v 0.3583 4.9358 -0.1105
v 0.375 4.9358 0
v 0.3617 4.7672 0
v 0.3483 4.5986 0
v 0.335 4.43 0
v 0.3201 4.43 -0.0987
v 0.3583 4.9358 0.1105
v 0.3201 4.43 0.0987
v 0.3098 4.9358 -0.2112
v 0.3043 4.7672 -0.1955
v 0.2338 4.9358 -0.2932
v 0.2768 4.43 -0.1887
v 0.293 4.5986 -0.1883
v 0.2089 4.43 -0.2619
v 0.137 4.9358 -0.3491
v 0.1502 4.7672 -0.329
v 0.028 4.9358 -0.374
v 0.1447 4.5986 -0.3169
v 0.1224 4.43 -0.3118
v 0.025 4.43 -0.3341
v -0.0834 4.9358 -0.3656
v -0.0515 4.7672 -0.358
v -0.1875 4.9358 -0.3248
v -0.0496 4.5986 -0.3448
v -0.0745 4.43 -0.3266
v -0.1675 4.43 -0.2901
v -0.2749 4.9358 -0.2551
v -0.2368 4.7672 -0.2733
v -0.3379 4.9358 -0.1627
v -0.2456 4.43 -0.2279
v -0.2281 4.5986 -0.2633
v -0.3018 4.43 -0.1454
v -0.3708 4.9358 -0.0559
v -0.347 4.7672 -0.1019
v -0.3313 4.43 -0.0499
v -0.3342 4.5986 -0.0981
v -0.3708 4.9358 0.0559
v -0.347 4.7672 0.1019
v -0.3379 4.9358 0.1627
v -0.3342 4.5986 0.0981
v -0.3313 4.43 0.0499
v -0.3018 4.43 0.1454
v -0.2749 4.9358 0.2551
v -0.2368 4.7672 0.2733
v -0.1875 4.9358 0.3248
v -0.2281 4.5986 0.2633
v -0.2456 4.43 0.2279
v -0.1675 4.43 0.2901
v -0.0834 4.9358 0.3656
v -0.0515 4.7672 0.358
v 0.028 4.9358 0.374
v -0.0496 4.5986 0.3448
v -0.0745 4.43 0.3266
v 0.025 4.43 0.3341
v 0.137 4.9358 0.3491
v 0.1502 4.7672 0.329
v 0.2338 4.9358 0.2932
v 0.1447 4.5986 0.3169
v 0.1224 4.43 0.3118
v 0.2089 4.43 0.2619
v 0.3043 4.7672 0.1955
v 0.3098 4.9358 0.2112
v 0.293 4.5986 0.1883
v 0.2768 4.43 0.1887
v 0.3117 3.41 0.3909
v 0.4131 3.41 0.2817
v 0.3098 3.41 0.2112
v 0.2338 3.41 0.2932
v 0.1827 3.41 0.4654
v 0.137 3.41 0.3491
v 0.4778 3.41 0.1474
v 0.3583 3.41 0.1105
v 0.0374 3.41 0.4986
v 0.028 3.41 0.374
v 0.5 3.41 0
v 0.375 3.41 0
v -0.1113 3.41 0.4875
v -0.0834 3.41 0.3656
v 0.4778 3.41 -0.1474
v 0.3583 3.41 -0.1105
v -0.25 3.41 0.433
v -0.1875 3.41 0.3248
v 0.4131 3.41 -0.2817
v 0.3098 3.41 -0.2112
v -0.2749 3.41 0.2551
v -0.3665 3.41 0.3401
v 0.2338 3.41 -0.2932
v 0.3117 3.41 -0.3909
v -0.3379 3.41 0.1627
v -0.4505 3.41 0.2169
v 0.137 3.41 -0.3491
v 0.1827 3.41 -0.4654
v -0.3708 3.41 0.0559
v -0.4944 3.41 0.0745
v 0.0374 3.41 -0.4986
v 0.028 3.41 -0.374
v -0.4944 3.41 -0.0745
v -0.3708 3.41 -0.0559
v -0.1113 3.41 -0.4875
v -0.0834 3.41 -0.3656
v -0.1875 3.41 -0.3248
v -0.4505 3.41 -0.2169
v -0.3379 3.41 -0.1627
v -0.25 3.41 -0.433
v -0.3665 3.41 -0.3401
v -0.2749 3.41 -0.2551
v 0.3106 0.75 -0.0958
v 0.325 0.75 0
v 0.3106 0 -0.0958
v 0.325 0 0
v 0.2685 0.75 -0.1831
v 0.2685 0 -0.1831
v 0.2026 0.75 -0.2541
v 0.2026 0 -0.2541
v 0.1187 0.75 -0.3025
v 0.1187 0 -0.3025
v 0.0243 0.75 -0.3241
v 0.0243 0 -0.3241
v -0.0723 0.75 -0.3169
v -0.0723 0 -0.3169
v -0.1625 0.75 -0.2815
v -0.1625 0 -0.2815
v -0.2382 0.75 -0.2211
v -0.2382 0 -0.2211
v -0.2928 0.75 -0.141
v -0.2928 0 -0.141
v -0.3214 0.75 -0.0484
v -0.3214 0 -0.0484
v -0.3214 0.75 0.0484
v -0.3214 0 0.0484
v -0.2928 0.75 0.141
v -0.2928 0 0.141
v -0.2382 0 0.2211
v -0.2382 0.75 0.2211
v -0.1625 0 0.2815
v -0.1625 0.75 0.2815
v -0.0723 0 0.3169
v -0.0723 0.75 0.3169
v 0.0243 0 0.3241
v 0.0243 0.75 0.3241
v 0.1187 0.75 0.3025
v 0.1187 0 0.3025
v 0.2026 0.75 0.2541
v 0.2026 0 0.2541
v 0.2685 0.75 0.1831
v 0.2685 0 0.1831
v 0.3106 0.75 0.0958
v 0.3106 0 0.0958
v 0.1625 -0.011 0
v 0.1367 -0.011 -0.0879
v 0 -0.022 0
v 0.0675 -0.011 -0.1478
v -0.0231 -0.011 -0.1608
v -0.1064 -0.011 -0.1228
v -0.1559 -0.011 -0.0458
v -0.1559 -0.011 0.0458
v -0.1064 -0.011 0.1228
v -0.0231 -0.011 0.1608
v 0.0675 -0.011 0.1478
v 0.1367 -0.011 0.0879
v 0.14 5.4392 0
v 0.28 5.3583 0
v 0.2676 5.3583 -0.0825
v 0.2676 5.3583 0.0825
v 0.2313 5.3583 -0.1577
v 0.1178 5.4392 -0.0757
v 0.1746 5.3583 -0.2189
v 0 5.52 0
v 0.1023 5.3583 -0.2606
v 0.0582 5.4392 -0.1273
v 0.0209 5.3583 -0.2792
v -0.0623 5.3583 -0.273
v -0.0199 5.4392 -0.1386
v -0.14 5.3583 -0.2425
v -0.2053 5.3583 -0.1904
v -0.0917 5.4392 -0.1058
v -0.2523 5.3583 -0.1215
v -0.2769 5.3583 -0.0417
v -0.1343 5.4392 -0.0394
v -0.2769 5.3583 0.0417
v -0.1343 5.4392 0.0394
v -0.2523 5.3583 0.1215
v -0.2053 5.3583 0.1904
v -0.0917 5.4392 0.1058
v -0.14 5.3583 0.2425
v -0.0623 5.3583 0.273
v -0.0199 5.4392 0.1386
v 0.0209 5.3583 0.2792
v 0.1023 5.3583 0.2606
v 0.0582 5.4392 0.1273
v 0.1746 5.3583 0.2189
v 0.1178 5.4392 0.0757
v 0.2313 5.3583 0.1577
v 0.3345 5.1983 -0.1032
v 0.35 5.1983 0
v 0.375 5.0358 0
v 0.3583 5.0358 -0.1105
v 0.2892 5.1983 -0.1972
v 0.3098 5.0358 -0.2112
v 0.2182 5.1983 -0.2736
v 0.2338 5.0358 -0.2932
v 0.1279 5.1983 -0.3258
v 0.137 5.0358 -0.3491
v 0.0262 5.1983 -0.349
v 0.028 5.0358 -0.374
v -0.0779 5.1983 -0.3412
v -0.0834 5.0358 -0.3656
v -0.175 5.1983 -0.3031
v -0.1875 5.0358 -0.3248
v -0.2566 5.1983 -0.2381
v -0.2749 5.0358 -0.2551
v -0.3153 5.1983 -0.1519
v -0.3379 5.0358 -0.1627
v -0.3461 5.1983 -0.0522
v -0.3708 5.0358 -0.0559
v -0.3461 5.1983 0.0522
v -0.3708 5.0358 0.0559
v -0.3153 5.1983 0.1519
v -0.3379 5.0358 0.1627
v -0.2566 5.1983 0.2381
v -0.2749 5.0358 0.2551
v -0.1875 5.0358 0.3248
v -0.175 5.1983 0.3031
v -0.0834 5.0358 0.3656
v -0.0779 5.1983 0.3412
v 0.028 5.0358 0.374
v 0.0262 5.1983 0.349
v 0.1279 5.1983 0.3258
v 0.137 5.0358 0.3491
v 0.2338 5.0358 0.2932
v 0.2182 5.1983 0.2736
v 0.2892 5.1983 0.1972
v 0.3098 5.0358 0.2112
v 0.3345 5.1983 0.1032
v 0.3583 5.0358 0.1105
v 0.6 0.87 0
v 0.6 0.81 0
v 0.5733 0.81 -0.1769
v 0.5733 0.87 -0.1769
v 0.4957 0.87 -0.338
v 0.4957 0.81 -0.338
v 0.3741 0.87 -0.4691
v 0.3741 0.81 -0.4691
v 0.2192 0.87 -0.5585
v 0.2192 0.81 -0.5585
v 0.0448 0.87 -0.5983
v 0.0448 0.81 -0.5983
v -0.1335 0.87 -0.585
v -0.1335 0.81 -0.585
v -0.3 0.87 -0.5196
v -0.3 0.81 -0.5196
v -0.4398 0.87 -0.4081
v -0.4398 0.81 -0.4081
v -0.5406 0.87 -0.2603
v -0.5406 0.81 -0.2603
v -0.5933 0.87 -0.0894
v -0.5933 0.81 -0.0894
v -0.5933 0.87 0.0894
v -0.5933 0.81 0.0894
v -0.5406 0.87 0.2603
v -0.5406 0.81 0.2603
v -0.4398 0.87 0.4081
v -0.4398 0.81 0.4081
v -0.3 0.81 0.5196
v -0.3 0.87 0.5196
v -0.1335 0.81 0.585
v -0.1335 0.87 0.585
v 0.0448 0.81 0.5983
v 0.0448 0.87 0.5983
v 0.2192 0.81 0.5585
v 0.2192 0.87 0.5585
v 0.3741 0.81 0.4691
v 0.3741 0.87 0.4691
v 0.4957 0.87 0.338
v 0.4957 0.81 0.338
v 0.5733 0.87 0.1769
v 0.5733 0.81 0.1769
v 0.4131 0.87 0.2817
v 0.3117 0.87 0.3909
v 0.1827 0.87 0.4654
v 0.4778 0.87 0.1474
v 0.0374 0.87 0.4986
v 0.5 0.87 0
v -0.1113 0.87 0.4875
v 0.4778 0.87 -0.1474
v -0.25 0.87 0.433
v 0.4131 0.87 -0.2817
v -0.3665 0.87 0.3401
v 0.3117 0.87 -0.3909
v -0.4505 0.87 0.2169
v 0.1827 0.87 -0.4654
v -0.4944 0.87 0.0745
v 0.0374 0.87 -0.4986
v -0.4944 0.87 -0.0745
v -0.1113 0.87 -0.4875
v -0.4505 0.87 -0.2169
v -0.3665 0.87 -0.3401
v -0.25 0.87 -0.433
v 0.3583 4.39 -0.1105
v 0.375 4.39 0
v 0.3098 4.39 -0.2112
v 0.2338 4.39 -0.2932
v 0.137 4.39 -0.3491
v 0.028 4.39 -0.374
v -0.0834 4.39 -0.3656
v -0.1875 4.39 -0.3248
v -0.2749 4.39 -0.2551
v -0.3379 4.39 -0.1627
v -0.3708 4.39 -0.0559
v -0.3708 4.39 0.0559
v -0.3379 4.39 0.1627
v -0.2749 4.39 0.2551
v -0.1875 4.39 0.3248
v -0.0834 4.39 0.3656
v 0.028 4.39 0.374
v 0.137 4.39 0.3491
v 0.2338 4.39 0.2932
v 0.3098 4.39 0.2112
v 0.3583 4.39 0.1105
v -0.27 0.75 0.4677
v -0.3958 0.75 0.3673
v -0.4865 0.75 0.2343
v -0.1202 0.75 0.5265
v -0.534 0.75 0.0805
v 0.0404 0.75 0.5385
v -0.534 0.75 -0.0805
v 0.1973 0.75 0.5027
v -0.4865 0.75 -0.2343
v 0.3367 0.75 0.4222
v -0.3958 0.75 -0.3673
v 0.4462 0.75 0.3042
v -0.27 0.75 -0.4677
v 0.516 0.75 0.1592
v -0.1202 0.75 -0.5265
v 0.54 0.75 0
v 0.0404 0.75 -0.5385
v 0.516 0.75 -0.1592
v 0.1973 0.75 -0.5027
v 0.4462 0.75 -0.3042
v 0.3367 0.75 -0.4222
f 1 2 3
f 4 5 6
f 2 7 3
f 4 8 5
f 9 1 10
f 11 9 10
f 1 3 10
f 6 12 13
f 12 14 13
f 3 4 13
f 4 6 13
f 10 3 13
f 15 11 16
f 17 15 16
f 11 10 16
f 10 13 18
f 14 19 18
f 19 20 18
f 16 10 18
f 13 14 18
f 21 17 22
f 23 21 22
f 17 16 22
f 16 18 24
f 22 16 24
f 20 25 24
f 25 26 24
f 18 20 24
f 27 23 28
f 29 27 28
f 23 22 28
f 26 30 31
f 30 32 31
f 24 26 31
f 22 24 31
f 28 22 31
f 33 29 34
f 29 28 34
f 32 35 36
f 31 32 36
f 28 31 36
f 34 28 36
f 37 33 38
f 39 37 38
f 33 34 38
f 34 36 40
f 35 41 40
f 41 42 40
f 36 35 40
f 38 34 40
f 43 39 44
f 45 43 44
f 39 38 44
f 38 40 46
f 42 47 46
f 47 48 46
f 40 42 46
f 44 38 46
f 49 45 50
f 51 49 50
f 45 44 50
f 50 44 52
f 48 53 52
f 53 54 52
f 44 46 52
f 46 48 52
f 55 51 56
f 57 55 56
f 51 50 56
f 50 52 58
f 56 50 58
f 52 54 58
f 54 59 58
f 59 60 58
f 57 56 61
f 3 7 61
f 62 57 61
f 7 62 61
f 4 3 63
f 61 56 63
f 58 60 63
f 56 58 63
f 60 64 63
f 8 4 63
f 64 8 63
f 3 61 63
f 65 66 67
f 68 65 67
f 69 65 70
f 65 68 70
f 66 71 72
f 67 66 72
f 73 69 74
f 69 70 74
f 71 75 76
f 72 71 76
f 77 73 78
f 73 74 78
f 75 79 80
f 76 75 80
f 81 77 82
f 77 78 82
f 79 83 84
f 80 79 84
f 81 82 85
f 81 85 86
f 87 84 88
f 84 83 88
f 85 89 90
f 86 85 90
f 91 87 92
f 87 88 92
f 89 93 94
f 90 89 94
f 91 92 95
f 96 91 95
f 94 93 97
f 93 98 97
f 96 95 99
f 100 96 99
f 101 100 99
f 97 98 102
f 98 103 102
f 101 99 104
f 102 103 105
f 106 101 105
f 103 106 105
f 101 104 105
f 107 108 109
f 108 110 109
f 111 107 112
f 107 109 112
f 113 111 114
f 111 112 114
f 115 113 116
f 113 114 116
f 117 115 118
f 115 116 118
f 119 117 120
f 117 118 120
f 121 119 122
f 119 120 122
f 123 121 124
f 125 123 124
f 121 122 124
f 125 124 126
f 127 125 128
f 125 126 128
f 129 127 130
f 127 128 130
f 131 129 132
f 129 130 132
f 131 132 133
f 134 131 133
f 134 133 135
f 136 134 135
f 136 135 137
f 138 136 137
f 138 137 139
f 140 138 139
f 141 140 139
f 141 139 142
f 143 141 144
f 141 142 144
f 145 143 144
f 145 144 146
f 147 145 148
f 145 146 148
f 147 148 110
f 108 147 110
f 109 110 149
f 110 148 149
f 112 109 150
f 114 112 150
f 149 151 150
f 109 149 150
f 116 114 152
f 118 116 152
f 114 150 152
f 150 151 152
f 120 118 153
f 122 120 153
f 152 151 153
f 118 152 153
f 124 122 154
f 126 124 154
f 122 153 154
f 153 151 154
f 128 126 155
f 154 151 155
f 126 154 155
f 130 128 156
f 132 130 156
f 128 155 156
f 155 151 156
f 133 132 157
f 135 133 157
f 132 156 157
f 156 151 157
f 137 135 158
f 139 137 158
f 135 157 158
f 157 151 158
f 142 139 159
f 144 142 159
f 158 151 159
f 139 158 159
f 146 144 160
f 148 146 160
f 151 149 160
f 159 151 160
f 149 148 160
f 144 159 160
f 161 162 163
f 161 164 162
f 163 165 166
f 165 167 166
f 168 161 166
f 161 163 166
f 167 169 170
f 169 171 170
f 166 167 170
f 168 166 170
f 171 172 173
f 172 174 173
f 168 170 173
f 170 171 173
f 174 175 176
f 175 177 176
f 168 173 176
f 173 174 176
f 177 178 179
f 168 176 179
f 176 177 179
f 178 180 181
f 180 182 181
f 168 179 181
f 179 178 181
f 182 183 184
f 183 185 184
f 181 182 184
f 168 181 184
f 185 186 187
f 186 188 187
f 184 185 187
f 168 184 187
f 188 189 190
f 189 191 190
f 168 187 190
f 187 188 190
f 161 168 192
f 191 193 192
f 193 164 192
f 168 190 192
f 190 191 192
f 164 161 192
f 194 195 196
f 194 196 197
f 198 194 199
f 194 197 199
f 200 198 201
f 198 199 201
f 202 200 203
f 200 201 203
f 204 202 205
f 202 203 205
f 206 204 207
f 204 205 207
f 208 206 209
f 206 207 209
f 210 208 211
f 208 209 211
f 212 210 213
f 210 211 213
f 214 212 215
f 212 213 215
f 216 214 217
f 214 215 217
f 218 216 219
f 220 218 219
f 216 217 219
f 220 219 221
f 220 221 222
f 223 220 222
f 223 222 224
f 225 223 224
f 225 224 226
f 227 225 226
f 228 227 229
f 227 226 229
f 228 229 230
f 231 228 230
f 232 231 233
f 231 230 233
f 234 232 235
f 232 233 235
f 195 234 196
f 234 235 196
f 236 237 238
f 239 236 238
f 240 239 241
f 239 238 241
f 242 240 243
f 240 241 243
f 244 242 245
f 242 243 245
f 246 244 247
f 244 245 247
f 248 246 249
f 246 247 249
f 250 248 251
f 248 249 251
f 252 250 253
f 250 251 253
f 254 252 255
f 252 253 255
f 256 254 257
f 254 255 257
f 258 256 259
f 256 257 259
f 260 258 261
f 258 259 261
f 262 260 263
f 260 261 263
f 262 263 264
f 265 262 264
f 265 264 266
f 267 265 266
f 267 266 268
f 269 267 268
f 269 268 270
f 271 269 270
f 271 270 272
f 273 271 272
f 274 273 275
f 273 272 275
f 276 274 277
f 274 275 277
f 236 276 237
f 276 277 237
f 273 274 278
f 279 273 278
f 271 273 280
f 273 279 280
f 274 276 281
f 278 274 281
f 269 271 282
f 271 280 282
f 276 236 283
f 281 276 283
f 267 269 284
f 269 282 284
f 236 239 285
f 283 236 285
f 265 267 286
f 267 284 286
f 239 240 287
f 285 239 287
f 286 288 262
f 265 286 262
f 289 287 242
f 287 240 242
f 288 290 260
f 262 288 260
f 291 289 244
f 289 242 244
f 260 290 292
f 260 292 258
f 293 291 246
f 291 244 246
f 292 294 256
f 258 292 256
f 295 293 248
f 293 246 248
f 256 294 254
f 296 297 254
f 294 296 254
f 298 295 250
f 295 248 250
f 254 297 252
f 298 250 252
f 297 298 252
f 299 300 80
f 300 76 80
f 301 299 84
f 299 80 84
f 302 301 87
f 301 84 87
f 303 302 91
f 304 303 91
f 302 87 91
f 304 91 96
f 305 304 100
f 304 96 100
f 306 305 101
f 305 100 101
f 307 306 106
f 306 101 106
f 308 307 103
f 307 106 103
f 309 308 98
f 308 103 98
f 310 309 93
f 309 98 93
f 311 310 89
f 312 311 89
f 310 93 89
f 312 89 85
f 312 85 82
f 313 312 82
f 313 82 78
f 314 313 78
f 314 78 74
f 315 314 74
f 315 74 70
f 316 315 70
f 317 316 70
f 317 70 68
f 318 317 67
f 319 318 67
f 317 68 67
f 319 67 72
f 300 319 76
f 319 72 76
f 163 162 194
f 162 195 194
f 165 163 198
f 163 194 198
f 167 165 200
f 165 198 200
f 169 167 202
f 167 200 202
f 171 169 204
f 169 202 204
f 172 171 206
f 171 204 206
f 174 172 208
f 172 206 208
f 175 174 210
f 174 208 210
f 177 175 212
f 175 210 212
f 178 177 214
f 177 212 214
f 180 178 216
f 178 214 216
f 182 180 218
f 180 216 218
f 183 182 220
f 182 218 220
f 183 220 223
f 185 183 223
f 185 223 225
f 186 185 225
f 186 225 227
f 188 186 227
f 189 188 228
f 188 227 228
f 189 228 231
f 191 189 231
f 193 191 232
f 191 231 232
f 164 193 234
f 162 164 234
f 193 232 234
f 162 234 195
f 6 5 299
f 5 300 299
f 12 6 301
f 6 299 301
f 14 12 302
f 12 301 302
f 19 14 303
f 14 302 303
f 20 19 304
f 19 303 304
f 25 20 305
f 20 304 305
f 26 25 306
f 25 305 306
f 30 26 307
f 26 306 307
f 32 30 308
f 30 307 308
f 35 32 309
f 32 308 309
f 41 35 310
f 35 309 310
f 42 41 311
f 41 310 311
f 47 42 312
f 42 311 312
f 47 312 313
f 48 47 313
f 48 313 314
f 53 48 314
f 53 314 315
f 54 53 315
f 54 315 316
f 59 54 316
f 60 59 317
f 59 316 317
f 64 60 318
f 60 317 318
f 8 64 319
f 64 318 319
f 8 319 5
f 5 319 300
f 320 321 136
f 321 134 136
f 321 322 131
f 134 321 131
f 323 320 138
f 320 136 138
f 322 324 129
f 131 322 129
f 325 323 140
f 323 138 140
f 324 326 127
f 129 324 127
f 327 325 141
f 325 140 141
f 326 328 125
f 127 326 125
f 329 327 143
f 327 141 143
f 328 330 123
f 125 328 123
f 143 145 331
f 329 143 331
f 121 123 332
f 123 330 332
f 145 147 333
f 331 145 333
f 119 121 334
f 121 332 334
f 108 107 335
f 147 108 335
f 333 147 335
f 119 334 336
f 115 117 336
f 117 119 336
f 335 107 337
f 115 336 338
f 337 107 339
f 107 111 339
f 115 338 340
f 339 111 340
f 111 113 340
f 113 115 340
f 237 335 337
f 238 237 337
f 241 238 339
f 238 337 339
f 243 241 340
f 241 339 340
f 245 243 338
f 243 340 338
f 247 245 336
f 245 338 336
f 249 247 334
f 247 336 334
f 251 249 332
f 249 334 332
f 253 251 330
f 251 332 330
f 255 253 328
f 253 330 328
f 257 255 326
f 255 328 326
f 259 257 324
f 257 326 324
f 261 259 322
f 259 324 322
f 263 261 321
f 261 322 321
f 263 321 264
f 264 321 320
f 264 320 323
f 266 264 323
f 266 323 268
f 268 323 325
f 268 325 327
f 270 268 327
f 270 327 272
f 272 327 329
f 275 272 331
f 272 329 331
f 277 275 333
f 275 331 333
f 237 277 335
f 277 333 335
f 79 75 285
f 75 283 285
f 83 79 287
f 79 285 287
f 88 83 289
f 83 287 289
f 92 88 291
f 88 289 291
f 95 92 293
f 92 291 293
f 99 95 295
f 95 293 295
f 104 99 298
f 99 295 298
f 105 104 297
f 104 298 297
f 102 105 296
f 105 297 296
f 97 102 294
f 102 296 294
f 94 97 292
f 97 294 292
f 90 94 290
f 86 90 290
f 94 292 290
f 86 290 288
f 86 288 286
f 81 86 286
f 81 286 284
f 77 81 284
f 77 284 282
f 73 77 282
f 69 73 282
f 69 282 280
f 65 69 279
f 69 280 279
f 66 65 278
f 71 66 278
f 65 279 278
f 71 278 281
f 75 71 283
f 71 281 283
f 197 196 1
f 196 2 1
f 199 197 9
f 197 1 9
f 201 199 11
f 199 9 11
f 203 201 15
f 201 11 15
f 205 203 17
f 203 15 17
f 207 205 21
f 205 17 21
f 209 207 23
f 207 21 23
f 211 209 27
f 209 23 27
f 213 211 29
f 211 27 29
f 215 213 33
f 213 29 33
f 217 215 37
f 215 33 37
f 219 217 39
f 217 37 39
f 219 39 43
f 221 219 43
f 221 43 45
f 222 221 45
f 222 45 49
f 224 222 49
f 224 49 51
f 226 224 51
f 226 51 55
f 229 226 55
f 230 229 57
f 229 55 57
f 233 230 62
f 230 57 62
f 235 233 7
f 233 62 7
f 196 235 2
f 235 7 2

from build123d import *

# Parameters (mm, degrees)
CHAMFER1_SIZE = 0.06


with BuildPart() as part:
    # Sketch1 → Revolve1 (revolve)
    with BuildSketch(Plane(origin=(0, 0, 0), x_dir=(-1, 0, 0), z_dir=(0, 0, -1))):
        Polygon((0, 5.52), (-0.28, 5.358341925), (-0.35, 5.198341925), (-0.375, 5.035841925), (-0.375, 4.935841925), (-0.335, 4.43), (-0.375, 4.39), (-0.375, 3.41), (-0.5, 3.41), (-0.5, 0.87), (-0.6, 0.87), (-0.6, 0.75), (-0.325, 0.75), (-0.325, 0), (0, -0.022), align=None)
    revolve(axis=Axis((0, -1000, 0), (0, 1, 0)))

    # Chamfer1
    chamfer1_edges = [part.edges().sort_by_distance(p)[0] for p in [
        (-0.6, 0.75, 0),
    ]]
    chamfer(chamfer1_edges, length=CHAMFER1_SIZE)


solid = part.part
